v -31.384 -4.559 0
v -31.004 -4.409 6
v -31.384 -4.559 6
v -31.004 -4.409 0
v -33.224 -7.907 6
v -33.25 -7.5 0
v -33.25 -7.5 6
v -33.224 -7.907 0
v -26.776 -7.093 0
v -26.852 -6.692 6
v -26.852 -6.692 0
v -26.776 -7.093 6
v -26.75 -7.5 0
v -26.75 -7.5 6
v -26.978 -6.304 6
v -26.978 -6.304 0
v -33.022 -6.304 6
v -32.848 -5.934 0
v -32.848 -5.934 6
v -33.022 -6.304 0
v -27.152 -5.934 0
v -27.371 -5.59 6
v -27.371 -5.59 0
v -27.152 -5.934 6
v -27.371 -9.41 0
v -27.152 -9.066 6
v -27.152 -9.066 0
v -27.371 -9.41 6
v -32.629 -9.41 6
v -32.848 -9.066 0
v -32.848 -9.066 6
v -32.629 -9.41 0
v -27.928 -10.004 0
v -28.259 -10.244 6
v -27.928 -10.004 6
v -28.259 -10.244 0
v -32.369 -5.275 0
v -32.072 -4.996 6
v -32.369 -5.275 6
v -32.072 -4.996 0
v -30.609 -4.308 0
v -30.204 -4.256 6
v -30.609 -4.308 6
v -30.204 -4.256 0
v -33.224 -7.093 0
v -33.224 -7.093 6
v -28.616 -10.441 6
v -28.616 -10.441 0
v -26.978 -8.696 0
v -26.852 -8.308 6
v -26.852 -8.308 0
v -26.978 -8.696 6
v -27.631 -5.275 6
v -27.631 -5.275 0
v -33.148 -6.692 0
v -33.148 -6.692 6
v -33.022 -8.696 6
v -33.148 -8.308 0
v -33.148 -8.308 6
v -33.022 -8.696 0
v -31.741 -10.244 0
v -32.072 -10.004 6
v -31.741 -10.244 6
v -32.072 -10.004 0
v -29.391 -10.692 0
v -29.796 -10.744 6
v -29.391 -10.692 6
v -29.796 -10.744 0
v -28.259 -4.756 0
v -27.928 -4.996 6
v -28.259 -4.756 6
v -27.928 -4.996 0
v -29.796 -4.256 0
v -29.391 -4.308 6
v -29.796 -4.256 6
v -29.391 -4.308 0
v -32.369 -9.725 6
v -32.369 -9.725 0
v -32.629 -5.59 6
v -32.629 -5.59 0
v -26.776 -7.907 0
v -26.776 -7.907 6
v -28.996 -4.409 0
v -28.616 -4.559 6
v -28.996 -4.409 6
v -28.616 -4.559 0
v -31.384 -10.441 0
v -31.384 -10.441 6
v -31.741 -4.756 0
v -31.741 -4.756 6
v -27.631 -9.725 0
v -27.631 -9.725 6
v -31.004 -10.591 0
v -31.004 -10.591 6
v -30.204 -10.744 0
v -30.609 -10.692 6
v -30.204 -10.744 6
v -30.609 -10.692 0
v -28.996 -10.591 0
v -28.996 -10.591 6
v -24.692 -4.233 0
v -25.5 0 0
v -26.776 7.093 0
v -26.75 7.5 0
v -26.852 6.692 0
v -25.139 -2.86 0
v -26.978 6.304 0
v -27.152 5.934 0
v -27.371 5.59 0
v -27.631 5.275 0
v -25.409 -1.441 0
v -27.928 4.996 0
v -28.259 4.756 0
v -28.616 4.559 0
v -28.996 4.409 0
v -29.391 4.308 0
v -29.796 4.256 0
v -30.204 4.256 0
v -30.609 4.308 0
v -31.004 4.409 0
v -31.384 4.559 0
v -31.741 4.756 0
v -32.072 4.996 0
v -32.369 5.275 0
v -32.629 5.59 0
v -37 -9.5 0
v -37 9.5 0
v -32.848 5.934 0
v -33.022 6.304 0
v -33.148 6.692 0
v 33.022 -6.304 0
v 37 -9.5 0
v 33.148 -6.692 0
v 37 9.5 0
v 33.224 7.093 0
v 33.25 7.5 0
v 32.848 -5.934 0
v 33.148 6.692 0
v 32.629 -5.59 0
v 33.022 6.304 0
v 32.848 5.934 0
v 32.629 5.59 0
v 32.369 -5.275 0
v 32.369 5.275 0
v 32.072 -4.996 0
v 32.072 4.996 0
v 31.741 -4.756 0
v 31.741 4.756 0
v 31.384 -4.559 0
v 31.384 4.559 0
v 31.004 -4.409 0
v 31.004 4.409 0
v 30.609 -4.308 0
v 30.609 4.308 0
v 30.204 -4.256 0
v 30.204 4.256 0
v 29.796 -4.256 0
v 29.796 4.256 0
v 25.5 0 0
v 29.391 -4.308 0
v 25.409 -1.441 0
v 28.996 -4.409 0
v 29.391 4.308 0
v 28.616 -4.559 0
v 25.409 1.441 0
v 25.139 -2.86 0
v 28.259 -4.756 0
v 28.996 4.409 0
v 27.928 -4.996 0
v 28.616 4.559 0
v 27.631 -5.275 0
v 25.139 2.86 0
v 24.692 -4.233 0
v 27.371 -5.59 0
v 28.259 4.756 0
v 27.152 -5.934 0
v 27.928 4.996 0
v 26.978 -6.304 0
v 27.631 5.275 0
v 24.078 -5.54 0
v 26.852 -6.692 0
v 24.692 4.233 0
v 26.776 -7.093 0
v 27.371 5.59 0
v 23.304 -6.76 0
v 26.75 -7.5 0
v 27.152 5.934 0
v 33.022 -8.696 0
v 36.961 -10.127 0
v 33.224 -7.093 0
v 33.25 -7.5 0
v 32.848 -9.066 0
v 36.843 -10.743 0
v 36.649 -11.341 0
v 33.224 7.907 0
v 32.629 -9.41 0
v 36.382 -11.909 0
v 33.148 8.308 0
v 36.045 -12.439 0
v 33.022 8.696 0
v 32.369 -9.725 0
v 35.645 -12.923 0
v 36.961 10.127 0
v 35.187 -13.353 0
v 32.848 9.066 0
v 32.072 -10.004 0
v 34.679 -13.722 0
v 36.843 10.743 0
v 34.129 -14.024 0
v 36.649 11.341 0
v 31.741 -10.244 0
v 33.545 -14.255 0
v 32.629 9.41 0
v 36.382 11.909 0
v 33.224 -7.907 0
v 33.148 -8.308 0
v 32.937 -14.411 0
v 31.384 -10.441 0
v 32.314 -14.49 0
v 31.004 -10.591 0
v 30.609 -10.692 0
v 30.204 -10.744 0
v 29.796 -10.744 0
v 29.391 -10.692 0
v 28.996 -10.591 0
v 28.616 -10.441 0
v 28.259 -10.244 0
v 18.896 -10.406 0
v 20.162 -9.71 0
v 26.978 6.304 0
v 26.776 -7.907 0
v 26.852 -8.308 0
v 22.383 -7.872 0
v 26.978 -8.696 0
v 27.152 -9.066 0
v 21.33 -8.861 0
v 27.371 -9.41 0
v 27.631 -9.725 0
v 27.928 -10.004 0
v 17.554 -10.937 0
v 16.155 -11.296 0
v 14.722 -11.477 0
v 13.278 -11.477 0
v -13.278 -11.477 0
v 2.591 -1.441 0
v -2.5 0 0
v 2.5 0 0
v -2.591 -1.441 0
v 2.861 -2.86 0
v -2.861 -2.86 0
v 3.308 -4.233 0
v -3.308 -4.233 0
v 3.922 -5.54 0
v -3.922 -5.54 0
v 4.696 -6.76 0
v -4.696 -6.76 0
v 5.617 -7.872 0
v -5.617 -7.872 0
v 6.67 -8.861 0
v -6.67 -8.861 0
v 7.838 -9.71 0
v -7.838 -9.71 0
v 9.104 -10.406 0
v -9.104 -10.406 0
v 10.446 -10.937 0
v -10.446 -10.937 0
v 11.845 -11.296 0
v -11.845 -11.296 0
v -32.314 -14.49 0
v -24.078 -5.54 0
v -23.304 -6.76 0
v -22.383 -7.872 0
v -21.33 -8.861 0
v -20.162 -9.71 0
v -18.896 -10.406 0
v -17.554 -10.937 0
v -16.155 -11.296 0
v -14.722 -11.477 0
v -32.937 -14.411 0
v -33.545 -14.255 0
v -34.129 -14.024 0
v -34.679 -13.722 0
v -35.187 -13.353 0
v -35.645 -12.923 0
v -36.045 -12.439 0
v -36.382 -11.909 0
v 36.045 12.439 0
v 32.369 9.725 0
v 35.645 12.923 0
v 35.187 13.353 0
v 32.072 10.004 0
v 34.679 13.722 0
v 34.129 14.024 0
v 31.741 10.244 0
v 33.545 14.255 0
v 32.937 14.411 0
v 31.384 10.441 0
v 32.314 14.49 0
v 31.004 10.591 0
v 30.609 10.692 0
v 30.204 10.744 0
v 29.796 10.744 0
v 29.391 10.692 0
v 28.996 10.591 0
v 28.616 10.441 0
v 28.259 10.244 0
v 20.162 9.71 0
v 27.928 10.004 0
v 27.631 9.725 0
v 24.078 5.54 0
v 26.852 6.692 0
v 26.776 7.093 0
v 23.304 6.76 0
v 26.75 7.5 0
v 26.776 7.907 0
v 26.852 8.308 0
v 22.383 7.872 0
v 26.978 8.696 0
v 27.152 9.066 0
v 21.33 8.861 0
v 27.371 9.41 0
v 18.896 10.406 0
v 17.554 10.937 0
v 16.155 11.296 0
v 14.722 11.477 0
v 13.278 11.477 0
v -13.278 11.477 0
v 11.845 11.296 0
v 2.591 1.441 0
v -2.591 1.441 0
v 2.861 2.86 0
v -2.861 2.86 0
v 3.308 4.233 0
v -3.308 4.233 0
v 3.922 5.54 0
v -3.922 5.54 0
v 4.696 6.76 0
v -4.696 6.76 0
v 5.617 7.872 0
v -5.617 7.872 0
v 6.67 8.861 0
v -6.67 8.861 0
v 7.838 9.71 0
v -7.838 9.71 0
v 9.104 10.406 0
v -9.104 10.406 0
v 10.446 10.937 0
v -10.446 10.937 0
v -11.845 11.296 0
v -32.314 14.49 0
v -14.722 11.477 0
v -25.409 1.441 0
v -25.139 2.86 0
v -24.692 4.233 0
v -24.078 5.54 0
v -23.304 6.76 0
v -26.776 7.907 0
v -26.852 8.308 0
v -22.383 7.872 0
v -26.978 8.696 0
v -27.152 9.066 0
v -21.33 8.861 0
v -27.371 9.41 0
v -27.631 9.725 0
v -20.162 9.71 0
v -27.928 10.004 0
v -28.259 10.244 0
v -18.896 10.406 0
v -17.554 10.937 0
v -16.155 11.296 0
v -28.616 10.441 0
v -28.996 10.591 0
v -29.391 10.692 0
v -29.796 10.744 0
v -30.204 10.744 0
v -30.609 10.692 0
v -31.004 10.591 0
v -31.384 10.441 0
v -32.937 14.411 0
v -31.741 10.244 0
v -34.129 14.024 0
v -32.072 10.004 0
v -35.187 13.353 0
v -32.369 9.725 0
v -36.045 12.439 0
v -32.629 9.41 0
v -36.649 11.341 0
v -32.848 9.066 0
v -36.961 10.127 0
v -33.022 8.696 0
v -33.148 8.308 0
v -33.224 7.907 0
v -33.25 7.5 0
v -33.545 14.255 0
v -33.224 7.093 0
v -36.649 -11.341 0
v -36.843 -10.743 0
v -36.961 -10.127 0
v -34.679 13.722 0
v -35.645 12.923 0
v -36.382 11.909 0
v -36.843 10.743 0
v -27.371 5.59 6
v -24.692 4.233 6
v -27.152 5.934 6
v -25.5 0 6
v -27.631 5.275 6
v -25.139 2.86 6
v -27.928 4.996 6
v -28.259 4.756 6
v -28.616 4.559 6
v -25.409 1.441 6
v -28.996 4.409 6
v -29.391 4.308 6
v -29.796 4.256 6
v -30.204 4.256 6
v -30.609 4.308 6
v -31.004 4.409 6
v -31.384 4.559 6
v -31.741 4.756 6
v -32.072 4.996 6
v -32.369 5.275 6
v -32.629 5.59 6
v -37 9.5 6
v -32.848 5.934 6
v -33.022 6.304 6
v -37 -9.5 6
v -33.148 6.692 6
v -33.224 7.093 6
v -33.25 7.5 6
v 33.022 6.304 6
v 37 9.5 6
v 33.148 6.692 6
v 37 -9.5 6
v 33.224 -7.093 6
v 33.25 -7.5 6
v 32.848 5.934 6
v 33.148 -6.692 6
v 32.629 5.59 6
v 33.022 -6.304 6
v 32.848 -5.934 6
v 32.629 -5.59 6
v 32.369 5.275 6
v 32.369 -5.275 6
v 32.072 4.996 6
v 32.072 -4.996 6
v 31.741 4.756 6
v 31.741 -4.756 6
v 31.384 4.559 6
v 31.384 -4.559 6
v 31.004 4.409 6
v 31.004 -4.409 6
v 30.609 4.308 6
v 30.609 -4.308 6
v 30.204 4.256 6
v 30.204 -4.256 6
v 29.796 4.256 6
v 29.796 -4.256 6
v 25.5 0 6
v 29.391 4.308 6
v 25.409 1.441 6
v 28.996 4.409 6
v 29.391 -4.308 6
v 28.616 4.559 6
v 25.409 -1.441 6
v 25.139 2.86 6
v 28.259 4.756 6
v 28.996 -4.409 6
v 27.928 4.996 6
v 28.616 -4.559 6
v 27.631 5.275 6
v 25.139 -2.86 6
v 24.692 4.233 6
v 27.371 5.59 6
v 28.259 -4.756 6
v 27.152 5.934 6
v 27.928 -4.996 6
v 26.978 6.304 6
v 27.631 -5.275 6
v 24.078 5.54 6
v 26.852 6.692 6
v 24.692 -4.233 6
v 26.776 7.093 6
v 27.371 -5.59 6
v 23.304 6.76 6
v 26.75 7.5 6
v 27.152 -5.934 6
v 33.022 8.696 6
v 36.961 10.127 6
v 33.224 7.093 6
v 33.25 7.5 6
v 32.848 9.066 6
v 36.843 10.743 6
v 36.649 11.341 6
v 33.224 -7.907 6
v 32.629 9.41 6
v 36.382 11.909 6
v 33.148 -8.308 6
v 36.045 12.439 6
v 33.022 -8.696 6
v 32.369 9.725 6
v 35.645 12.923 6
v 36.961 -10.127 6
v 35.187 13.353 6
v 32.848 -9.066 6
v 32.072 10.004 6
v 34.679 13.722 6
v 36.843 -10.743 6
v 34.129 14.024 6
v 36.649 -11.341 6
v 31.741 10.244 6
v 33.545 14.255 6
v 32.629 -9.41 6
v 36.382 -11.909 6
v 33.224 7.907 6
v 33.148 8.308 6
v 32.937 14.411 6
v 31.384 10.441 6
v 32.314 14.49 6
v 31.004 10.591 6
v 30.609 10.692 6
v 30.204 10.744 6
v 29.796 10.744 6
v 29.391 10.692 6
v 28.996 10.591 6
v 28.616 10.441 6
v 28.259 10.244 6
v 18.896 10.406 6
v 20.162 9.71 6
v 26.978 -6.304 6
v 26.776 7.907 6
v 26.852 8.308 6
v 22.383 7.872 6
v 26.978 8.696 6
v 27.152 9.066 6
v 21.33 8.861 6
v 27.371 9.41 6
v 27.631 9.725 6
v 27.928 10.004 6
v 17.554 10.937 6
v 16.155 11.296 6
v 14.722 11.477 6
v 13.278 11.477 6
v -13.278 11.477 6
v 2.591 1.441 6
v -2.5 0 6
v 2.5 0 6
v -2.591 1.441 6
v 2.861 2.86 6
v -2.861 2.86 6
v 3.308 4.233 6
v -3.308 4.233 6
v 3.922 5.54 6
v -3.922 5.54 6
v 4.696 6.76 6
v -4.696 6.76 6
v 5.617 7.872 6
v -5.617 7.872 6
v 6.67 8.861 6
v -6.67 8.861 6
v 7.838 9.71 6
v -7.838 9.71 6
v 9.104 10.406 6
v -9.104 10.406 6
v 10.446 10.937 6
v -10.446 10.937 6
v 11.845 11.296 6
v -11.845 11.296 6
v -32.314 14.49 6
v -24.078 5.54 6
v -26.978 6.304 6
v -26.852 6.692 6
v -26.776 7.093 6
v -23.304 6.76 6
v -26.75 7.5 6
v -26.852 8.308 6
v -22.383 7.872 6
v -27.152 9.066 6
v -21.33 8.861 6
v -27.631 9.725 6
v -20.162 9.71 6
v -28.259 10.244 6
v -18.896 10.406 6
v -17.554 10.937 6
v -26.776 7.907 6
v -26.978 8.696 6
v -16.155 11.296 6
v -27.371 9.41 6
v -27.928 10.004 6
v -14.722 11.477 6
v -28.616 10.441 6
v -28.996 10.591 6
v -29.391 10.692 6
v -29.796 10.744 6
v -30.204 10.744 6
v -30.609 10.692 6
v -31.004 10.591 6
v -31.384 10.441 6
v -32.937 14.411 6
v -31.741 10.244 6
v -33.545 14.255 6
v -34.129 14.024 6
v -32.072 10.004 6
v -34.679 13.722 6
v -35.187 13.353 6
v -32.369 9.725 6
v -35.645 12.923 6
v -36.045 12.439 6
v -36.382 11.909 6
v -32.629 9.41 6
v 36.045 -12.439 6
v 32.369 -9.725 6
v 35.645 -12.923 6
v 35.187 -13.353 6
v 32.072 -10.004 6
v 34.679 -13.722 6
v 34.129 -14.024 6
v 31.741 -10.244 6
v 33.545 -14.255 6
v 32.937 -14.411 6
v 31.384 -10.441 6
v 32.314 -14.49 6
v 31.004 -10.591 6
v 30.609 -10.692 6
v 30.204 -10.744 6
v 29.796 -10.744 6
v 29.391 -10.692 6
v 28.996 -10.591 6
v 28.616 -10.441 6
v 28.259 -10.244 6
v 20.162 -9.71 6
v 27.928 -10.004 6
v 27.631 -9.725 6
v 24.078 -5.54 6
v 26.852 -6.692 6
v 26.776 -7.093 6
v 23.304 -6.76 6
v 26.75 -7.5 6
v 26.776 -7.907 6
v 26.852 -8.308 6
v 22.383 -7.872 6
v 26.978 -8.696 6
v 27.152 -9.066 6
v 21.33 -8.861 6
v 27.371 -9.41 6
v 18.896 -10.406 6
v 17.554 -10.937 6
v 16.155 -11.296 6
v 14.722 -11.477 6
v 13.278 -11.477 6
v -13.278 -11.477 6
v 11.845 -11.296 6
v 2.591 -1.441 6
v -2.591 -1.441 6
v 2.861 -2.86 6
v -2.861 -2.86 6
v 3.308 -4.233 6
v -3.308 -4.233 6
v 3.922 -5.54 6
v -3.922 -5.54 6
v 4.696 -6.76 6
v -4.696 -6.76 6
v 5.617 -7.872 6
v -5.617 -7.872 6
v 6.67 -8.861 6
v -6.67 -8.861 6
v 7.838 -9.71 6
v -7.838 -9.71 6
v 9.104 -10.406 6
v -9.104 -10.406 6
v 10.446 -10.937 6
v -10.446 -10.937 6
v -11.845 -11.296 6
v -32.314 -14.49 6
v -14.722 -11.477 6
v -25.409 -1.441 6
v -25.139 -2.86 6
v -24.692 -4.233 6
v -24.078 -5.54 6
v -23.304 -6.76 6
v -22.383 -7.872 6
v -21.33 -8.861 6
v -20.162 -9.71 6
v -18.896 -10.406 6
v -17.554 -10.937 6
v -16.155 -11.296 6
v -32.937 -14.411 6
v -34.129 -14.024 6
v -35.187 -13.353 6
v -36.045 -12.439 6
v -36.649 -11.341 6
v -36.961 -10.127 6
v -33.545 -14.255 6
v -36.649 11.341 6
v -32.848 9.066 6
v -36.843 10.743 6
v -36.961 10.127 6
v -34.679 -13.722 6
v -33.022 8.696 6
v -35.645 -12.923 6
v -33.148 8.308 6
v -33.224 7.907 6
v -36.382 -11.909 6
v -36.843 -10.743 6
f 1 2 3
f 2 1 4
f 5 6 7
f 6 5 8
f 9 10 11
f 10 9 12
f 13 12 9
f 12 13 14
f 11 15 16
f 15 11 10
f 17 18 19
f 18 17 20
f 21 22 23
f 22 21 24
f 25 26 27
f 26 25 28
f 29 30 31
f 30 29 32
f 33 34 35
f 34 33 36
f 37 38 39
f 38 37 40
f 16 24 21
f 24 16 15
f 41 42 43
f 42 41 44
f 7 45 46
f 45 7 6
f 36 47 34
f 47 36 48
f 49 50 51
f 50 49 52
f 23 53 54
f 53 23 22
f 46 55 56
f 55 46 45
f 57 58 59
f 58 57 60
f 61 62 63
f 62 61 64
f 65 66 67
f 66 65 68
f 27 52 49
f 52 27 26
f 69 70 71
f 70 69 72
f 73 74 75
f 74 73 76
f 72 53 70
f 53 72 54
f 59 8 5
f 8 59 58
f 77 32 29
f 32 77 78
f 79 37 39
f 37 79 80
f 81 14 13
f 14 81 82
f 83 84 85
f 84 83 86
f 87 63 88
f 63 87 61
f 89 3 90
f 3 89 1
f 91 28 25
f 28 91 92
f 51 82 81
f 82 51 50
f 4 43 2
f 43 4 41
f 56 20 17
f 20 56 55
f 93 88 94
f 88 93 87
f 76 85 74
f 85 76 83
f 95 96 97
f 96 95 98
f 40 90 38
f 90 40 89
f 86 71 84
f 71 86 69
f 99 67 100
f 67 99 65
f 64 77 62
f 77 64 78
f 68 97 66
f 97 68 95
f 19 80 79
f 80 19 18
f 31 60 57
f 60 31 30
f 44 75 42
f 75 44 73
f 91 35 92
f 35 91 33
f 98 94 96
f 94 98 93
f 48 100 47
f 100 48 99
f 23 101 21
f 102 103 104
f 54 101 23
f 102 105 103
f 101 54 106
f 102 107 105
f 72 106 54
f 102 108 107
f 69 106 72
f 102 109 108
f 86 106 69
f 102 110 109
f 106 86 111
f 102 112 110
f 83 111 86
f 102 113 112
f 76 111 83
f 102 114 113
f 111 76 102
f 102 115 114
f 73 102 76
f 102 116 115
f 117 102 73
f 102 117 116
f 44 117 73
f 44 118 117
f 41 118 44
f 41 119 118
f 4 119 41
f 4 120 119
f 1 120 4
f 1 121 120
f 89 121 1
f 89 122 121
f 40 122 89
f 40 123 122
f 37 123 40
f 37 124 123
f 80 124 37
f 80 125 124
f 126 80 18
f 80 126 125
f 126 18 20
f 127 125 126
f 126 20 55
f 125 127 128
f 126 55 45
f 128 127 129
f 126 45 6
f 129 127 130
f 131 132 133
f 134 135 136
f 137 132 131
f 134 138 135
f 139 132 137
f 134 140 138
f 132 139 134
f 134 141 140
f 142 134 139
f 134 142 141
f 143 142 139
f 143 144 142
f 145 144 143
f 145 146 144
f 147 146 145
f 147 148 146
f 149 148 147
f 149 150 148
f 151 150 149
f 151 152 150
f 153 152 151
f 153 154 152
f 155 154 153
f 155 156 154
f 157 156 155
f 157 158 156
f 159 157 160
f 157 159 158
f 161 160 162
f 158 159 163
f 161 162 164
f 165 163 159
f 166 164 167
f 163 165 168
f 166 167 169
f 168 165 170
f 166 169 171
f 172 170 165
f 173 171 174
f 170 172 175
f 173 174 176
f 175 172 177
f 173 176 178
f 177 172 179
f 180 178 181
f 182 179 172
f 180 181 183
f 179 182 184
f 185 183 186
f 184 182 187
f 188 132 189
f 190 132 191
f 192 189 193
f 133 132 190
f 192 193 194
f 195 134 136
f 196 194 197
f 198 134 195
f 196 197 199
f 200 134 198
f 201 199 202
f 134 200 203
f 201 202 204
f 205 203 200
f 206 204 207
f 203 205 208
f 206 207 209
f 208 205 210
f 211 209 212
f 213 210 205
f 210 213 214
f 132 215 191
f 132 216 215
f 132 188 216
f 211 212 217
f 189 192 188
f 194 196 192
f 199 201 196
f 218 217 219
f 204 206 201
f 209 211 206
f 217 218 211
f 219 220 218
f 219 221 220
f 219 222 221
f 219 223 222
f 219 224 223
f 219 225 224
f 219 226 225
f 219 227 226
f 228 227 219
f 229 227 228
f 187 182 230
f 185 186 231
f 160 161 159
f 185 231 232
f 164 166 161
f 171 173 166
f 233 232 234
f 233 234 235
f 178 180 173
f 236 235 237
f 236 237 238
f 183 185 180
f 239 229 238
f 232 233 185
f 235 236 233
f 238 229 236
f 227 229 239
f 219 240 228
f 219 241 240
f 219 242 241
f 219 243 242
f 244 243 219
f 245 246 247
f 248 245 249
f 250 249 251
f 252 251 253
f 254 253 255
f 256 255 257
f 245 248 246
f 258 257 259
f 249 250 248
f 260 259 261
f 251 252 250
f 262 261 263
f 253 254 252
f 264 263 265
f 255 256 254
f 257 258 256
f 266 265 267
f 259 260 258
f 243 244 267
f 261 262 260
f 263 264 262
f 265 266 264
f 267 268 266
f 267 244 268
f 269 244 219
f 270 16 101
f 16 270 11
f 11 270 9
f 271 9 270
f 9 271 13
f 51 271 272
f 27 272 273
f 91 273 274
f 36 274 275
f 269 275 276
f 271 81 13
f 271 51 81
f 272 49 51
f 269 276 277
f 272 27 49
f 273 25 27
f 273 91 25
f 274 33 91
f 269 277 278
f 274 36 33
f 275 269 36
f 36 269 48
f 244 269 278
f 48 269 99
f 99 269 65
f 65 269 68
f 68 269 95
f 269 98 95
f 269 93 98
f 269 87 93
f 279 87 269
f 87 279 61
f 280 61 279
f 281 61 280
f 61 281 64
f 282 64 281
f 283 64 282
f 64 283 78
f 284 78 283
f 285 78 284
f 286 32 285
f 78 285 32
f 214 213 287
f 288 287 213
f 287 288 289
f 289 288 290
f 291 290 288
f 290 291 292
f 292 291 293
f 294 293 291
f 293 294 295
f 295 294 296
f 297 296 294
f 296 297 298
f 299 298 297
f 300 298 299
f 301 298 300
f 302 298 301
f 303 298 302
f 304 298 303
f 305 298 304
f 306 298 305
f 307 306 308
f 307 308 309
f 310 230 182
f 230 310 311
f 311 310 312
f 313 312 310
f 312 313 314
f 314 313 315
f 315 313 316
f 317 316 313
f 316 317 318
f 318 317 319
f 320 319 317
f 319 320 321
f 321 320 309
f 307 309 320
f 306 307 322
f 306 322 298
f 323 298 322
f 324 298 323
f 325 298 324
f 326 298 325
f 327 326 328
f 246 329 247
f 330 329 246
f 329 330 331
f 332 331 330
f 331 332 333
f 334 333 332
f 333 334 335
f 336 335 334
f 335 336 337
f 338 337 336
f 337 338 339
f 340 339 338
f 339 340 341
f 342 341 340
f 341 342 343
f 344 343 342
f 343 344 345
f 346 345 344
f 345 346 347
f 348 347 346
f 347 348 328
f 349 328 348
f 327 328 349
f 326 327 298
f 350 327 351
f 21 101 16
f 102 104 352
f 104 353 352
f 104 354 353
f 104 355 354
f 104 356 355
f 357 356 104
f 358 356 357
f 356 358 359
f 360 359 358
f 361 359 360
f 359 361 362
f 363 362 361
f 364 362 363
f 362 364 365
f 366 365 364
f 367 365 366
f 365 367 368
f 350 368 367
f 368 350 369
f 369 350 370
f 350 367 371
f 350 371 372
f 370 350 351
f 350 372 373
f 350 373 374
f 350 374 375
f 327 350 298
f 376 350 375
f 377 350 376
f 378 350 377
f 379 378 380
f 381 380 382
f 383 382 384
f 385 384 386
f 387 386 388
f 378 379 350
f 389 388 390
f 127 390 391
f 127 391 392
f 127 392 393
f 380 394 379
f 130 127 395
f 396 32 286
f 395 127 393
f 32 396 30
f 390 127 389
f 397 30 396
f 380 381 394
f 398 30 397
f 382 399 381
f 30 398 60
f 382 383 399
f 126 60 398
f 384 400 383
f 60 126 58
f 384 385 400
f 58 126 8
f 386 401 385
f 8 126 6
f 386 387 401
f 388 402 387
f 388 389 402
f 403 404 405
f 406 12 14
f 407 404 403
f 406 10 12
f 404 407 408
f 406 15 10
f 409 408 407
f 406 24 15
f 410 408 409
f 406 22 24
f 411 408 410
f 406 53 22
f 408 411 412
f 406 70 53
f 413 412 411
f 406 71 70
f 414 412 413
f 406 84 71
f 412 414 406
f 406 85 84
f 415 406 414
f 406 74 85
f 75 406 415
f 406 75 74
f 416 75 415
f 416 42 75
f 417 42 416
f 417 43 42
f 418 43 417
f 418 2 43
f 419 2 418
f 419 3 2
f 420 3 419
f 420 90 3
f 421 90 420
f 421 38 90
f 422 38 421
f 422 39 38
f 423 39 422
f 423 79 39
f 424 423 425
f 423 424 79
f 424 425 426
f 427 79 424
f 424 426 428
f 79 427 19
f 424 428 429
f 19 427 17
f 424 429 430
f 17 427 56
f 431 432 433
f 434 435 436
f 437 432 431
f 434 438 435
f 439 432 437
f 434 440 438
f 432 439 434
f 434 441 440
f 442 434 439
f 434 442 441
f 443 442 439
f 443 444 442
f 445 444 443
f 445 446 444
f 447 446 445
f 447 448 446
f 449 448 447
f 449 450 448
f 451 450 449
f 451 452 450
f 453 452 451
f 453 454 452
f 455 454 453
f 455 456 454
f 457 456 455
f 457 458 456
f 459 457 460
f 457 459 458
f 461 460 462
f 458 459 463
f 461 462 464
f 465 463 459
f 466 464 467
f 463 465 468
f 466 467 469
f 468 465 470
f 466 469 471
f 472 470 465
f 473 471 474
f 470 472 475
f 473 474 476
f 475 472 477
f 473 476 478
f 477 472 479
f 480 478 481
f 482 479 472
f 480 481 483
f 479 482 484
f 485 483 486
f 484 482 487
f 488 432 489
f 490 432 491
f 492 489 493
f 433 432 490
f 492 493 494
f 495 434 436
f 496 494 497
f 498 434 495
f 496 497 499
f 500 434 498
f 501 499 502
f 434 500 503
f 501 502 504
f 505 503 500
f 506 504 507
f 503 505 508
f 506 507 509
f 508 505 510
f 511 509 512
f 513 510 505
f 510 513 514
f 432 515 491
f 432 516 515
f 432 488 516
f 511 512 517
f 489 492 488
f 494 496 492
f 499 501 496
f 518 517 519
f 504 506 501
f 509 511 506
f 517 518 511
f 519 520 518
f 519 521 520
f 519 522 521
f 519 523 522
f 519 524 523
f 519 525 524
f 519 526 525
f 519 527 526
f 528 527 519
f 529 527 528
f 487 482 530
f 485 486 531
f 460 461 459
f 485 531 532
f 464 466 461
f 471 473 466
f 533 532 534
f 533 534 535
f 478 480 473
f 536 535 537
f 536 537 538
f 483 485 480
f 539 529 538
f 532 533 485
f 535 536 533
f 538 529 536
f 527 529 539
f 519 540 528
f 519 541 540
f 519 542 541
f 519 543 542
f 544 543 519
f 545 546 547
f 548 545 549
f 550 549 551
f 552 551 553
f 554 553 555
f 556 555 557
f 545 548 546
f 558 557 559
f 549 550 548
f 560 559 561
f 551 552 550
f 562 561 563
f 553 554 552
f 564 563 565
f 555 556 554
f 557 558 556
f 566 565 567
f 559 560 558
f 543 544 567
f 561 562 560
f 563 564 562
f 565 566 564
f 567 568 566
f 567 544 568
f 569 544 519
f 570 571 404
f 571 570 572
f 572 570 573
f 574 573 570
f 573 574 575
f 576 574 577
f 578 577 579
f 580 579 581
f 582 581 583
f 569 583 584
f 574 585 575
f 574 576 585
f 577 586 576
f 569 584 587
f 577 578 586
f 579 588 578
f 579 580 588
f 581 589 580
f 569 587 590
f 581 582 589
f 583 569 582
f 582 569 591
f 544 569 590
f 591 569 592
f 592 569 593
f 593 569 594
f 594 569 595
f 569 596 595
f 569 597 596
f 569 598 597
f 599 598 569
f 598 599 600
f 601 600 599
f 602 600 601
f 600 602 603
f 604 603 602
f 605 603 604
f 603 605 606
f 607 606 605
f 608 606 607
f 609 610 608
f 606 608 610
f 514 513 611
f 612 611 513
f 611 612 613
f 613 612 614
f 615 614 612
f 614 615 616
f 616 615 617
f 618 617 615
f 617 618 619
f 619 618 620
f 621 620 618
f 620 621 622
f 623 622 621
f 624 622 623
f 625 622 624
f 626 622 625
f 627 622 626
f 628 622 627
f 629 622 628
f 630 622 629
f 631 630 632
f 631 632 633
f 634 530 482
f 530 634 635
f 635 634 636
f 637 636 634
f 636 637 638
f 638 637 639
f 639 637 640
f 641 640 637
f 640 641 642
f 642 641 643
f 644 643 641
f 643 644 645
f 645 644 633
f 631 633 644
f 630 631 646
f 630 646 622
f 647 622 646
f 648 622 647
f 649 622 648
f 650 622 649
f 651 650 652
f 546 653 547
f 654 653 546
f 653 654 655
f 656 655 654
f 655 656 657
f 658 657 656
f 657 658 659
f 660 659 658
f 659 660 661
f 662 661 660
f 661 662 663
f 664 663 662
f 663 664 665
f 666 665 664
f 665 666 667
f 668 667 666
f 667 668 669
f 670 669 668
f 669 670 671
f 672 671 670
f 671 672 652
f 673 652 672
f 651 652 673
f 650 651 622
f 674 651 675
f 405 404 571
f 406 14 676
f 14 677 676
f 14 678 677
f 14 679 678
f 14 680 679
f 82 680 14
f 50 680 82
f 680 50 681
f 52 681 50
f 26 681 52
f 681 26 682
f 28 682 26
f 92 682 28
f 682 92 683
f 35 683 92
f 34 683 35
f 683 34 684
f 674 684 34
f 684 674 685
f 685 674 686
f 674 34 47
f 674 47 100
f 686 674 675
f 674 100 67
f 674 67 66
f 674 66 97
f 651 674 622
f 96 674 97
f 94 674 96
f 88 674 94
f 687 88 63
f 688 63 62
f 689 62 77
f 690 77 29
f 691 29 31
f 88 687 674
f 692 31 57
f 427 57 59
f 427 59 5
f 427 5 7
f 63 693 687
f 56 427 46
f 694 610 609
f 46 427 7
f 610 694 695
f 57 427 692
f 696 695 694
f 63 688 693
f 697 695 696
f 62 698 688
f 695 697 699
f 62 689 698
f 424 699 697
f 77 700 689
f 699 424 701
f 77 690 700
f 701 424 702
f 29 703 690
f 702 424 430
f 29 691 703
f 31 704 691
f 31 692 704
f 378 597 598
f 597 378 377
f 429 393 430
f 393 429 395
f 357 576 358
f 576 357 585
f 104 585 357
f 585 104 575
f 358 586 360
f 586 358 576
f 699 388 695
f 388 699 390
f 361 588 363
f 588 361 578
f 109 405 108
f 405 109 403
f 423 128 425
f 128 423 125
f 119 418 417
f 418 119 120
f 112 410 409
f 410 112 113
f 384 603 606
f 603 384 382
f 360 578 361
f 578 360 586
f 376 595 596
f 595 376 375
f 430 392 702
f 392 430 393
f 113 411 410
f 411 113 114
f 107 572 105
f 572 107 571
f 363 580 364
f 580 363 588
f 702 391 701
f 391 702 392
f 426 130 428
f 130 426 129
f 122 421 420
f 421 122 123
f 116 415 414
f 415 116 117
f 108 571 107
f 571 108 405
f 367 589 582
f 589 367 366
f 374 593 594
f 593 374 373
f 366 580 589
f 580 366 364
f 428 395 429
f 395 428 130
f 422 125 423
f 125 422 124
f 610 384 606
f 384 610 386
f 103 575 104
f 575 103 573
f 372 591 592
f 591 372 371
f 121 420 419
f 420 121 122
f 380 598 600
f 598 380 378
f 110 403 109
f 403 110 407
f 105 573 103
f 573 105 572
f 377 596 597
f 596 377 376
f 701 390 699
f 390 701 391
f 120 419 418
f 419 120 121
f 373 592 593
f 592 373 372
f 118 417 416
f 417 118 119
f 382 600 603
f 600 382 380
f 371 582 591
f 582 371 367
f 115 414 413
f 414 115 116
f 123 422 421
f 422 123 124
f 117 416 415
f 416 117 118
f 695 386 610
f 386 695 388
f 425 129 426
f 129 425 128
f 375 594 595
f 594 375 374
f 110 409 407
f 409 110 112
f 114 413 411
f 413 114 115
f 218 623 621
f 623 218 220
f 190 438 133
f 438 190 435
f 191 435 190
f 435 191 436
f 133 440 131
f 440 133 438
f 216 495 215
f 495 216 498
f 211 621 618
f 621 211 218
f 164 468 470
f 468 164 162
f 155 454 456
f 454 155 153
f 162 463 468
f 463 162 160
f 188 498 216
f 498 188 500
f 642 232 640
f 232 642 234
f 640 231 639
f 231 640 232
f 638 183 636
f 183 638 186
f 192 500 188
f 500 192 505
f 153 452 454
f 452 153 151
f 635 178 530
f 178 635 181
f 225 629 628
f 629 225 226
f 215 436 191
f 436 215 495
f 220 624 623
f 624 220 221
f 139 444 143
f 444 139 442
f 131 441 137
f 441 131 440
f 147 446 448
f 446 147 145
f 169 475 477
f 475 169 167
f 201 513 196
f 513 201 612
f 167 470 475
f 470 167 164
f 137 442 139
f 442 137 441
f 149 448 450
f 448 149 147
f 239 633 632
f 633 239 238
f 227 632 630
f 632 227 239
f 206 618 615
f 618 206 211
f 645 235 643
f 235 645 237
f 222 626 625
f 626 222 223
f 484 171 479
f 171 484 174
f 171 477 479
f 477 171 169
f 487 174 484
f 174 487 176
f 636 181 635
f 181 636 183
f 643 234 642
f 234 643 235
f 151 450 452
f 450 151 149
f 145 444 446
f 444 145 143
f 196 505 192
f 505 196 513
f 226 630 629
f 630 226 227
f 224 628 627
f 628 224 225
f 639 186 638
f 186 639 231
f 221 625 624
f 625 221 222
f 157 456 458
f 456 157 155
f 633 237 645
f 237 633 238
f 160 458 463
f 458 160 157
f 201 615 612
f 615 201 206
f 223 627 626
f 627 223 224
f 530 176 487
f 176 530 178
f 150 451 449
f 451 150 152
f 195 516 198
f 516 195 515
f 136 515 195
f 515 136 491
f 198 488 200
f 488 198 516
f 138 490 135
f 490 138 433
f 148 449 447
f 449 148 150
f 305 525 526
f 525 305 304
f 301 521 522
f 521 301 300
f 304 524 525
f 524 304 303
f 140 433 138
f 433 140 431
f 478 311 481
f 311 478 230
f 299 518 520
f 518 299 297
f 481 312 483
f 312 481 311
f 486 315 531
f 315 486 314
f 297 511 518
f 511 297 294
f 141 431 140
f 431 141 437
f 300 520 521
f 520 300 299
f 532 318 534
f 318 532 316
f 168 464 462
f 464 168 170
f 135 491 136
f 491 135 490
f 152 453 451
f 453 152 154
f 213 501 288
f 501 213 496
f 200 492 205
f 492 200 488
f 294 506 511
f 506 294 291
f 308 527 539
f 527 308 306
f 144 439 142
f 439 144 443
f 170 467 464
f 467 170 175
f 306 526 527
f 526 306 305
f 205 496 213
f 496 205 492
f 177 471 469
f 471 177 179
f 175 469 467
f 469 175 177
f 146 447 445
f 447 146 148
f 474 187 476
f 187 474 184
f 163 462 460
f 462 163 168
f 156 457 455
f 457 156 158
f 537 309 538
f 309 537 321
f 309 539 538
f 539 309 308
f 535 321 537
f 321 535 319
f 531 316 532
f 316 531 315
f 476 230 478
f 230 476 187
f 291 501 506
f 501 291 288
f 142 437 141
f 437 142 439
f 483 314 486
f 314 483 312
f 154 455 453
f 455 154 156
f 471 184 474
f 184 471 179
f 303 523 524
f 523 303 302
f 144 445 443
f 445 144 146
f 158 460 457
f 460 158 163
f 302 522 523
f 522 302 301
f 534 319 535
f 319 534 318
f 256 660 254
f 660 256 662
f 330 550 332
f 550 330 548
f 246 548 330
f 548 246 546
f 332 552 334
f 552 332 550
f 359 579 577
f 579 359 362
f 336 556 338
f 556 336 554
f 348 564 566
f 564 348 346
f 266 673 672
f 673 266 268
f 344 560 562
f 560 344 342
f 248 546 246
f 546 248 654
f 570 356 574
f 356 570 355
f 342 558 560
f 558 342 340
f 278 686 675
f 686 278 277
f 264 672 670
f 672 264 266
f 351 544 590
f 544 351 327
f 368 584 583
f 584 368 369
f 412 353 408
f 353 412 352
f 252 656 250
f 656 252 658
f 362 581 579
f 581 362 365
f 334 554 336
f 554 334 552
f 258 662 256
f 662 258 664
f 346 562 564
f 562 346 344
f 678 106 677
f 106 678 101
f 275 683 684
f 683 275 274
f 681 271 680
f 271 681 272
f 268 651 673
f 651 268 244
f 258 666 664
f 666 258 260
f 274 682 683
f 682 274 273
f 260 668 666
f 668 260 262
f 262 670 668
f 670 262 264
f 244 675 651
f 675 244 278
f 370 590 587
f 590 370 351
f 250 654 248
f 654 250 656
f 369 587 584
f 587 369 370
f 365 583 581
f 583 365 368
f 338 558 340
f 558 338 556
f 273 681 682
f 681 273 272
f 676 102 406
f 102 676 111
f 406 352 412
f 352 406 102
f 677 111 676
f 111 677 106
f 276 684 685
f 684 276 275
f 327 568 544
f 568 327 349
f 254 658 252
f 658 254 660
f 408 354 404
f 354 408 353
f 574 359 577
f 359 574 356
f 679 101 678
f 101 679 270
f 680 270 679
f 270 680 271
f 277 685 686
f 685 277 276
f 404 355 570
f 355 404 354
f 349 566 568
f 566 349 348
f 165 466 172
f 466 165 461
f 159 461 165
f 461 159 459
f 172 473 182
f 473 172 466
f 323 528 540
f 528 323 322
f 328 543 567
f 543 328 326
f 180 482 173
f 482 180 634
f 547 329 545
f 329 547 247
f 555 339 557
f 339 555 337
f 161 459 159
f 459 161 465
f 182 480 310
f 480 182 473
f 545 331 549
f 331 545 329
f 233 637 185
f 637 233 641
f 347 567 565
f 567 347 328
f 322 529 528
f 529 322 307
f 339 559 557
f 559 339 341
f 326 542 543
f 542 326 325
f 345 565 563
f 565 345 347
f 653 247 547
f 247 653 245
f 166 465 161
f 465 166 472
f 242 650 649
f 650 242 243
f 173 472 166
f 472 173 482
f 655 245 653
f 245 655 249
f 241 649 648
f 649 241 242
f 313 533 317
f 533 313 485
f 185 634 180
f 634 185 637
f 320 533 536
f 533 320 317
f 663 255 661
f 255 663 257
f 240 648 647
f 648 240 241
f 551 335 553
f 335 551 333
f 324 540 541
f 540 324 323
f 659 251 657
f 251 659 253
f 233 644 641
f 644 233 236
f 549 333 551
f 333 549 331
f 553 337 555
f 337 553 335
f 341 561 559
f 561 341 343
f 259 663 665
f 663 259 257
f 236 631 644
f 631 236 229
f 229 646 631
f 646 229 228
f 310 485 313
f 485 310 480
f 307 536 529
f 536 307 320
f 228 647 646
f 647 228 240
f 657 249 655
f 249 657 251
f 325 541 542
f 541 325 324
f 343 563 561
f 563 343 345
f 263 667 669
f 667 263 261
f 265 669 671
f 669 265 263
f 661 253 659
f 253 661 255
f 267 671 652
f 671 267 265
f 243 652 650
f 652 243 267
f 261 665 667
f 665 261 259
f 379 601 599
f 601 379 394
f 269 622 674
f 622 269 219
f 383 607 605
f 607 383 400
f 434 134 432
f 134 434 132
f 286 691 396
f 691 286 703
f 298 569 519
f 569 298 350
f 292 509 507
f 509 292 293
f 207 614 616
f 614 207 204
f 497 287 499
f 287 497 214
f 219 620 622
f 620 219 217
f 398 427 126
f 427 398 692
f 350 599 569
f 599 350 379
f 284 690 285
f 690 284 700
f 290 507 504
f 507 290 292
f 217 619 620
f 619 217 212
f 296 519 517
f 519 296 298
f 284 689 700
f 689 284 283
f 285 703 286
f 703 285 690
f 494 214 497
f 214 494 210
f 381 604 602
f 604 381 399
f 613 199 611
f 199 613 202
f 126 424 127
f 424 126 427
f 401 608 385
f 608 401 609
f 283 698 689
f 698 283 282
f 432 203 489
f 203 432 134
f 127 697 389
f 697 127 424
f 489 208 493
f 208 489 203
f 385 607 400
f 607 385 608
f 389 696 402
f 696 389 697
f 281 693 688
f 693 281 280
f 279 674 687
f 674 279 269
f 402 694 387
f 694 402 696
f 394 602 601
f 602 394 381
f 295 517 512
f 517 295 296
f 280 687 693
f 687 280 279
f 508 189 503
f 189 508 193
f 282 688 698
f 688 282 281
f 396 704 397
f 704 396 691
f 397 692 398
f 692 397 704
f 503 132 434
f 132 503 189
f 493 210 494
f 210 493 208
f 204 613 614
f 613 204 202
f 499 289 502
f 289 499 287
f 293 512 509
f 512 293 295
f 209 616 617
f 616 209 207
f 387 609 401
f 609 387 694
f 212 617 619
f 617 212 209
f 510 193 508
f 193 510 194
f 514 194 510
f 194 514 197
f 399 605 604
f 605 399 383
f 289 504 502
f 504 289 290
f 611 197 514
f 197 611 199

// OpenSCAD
$fn = 50;

difference() {
	union() {
		hull() {
			translate(v = [-32.0, 9.5, 0]) {
				cylinder(h = 6, r = 5);
			}
			translate(v = [32.0, 9.5, 0]) {
				cylinder(h = 6, r = 5);
			}
			translate(v = [-32.0, -9.5, 0]) {
				cylinder(h = 6, r = 5);
			}
			translate(v = [32.0, -9.5, 0]) {
				cylinder(h = 6, r = 5);
			}
		}
	}
	union() {
		translate(v = [-30.0, -7.5, 0]) {
			cylinder(h = 6, r = 3.25);
		}
		translate(v = [-30.0, 7.5, 0]) {
			cylinder(h = 6, r = 3.25);
		}
		translate(v = [30.0, -7.5, 0]) {
			cylinder(h = 6, r = 3.25);
		}
		translate(v = [30.0, 7.5, 0]) {
			cylinder(h = 6, r = 3.25);
		}
		translate(v = [-14.0, 0, 0.0]) {
			cylinder(h = 6, r = 11.5);
		}
		translate(v = [14.0, 0, 0.0]) {
			cylinder(h = 6, r = 11.5);
		}
	}
}
